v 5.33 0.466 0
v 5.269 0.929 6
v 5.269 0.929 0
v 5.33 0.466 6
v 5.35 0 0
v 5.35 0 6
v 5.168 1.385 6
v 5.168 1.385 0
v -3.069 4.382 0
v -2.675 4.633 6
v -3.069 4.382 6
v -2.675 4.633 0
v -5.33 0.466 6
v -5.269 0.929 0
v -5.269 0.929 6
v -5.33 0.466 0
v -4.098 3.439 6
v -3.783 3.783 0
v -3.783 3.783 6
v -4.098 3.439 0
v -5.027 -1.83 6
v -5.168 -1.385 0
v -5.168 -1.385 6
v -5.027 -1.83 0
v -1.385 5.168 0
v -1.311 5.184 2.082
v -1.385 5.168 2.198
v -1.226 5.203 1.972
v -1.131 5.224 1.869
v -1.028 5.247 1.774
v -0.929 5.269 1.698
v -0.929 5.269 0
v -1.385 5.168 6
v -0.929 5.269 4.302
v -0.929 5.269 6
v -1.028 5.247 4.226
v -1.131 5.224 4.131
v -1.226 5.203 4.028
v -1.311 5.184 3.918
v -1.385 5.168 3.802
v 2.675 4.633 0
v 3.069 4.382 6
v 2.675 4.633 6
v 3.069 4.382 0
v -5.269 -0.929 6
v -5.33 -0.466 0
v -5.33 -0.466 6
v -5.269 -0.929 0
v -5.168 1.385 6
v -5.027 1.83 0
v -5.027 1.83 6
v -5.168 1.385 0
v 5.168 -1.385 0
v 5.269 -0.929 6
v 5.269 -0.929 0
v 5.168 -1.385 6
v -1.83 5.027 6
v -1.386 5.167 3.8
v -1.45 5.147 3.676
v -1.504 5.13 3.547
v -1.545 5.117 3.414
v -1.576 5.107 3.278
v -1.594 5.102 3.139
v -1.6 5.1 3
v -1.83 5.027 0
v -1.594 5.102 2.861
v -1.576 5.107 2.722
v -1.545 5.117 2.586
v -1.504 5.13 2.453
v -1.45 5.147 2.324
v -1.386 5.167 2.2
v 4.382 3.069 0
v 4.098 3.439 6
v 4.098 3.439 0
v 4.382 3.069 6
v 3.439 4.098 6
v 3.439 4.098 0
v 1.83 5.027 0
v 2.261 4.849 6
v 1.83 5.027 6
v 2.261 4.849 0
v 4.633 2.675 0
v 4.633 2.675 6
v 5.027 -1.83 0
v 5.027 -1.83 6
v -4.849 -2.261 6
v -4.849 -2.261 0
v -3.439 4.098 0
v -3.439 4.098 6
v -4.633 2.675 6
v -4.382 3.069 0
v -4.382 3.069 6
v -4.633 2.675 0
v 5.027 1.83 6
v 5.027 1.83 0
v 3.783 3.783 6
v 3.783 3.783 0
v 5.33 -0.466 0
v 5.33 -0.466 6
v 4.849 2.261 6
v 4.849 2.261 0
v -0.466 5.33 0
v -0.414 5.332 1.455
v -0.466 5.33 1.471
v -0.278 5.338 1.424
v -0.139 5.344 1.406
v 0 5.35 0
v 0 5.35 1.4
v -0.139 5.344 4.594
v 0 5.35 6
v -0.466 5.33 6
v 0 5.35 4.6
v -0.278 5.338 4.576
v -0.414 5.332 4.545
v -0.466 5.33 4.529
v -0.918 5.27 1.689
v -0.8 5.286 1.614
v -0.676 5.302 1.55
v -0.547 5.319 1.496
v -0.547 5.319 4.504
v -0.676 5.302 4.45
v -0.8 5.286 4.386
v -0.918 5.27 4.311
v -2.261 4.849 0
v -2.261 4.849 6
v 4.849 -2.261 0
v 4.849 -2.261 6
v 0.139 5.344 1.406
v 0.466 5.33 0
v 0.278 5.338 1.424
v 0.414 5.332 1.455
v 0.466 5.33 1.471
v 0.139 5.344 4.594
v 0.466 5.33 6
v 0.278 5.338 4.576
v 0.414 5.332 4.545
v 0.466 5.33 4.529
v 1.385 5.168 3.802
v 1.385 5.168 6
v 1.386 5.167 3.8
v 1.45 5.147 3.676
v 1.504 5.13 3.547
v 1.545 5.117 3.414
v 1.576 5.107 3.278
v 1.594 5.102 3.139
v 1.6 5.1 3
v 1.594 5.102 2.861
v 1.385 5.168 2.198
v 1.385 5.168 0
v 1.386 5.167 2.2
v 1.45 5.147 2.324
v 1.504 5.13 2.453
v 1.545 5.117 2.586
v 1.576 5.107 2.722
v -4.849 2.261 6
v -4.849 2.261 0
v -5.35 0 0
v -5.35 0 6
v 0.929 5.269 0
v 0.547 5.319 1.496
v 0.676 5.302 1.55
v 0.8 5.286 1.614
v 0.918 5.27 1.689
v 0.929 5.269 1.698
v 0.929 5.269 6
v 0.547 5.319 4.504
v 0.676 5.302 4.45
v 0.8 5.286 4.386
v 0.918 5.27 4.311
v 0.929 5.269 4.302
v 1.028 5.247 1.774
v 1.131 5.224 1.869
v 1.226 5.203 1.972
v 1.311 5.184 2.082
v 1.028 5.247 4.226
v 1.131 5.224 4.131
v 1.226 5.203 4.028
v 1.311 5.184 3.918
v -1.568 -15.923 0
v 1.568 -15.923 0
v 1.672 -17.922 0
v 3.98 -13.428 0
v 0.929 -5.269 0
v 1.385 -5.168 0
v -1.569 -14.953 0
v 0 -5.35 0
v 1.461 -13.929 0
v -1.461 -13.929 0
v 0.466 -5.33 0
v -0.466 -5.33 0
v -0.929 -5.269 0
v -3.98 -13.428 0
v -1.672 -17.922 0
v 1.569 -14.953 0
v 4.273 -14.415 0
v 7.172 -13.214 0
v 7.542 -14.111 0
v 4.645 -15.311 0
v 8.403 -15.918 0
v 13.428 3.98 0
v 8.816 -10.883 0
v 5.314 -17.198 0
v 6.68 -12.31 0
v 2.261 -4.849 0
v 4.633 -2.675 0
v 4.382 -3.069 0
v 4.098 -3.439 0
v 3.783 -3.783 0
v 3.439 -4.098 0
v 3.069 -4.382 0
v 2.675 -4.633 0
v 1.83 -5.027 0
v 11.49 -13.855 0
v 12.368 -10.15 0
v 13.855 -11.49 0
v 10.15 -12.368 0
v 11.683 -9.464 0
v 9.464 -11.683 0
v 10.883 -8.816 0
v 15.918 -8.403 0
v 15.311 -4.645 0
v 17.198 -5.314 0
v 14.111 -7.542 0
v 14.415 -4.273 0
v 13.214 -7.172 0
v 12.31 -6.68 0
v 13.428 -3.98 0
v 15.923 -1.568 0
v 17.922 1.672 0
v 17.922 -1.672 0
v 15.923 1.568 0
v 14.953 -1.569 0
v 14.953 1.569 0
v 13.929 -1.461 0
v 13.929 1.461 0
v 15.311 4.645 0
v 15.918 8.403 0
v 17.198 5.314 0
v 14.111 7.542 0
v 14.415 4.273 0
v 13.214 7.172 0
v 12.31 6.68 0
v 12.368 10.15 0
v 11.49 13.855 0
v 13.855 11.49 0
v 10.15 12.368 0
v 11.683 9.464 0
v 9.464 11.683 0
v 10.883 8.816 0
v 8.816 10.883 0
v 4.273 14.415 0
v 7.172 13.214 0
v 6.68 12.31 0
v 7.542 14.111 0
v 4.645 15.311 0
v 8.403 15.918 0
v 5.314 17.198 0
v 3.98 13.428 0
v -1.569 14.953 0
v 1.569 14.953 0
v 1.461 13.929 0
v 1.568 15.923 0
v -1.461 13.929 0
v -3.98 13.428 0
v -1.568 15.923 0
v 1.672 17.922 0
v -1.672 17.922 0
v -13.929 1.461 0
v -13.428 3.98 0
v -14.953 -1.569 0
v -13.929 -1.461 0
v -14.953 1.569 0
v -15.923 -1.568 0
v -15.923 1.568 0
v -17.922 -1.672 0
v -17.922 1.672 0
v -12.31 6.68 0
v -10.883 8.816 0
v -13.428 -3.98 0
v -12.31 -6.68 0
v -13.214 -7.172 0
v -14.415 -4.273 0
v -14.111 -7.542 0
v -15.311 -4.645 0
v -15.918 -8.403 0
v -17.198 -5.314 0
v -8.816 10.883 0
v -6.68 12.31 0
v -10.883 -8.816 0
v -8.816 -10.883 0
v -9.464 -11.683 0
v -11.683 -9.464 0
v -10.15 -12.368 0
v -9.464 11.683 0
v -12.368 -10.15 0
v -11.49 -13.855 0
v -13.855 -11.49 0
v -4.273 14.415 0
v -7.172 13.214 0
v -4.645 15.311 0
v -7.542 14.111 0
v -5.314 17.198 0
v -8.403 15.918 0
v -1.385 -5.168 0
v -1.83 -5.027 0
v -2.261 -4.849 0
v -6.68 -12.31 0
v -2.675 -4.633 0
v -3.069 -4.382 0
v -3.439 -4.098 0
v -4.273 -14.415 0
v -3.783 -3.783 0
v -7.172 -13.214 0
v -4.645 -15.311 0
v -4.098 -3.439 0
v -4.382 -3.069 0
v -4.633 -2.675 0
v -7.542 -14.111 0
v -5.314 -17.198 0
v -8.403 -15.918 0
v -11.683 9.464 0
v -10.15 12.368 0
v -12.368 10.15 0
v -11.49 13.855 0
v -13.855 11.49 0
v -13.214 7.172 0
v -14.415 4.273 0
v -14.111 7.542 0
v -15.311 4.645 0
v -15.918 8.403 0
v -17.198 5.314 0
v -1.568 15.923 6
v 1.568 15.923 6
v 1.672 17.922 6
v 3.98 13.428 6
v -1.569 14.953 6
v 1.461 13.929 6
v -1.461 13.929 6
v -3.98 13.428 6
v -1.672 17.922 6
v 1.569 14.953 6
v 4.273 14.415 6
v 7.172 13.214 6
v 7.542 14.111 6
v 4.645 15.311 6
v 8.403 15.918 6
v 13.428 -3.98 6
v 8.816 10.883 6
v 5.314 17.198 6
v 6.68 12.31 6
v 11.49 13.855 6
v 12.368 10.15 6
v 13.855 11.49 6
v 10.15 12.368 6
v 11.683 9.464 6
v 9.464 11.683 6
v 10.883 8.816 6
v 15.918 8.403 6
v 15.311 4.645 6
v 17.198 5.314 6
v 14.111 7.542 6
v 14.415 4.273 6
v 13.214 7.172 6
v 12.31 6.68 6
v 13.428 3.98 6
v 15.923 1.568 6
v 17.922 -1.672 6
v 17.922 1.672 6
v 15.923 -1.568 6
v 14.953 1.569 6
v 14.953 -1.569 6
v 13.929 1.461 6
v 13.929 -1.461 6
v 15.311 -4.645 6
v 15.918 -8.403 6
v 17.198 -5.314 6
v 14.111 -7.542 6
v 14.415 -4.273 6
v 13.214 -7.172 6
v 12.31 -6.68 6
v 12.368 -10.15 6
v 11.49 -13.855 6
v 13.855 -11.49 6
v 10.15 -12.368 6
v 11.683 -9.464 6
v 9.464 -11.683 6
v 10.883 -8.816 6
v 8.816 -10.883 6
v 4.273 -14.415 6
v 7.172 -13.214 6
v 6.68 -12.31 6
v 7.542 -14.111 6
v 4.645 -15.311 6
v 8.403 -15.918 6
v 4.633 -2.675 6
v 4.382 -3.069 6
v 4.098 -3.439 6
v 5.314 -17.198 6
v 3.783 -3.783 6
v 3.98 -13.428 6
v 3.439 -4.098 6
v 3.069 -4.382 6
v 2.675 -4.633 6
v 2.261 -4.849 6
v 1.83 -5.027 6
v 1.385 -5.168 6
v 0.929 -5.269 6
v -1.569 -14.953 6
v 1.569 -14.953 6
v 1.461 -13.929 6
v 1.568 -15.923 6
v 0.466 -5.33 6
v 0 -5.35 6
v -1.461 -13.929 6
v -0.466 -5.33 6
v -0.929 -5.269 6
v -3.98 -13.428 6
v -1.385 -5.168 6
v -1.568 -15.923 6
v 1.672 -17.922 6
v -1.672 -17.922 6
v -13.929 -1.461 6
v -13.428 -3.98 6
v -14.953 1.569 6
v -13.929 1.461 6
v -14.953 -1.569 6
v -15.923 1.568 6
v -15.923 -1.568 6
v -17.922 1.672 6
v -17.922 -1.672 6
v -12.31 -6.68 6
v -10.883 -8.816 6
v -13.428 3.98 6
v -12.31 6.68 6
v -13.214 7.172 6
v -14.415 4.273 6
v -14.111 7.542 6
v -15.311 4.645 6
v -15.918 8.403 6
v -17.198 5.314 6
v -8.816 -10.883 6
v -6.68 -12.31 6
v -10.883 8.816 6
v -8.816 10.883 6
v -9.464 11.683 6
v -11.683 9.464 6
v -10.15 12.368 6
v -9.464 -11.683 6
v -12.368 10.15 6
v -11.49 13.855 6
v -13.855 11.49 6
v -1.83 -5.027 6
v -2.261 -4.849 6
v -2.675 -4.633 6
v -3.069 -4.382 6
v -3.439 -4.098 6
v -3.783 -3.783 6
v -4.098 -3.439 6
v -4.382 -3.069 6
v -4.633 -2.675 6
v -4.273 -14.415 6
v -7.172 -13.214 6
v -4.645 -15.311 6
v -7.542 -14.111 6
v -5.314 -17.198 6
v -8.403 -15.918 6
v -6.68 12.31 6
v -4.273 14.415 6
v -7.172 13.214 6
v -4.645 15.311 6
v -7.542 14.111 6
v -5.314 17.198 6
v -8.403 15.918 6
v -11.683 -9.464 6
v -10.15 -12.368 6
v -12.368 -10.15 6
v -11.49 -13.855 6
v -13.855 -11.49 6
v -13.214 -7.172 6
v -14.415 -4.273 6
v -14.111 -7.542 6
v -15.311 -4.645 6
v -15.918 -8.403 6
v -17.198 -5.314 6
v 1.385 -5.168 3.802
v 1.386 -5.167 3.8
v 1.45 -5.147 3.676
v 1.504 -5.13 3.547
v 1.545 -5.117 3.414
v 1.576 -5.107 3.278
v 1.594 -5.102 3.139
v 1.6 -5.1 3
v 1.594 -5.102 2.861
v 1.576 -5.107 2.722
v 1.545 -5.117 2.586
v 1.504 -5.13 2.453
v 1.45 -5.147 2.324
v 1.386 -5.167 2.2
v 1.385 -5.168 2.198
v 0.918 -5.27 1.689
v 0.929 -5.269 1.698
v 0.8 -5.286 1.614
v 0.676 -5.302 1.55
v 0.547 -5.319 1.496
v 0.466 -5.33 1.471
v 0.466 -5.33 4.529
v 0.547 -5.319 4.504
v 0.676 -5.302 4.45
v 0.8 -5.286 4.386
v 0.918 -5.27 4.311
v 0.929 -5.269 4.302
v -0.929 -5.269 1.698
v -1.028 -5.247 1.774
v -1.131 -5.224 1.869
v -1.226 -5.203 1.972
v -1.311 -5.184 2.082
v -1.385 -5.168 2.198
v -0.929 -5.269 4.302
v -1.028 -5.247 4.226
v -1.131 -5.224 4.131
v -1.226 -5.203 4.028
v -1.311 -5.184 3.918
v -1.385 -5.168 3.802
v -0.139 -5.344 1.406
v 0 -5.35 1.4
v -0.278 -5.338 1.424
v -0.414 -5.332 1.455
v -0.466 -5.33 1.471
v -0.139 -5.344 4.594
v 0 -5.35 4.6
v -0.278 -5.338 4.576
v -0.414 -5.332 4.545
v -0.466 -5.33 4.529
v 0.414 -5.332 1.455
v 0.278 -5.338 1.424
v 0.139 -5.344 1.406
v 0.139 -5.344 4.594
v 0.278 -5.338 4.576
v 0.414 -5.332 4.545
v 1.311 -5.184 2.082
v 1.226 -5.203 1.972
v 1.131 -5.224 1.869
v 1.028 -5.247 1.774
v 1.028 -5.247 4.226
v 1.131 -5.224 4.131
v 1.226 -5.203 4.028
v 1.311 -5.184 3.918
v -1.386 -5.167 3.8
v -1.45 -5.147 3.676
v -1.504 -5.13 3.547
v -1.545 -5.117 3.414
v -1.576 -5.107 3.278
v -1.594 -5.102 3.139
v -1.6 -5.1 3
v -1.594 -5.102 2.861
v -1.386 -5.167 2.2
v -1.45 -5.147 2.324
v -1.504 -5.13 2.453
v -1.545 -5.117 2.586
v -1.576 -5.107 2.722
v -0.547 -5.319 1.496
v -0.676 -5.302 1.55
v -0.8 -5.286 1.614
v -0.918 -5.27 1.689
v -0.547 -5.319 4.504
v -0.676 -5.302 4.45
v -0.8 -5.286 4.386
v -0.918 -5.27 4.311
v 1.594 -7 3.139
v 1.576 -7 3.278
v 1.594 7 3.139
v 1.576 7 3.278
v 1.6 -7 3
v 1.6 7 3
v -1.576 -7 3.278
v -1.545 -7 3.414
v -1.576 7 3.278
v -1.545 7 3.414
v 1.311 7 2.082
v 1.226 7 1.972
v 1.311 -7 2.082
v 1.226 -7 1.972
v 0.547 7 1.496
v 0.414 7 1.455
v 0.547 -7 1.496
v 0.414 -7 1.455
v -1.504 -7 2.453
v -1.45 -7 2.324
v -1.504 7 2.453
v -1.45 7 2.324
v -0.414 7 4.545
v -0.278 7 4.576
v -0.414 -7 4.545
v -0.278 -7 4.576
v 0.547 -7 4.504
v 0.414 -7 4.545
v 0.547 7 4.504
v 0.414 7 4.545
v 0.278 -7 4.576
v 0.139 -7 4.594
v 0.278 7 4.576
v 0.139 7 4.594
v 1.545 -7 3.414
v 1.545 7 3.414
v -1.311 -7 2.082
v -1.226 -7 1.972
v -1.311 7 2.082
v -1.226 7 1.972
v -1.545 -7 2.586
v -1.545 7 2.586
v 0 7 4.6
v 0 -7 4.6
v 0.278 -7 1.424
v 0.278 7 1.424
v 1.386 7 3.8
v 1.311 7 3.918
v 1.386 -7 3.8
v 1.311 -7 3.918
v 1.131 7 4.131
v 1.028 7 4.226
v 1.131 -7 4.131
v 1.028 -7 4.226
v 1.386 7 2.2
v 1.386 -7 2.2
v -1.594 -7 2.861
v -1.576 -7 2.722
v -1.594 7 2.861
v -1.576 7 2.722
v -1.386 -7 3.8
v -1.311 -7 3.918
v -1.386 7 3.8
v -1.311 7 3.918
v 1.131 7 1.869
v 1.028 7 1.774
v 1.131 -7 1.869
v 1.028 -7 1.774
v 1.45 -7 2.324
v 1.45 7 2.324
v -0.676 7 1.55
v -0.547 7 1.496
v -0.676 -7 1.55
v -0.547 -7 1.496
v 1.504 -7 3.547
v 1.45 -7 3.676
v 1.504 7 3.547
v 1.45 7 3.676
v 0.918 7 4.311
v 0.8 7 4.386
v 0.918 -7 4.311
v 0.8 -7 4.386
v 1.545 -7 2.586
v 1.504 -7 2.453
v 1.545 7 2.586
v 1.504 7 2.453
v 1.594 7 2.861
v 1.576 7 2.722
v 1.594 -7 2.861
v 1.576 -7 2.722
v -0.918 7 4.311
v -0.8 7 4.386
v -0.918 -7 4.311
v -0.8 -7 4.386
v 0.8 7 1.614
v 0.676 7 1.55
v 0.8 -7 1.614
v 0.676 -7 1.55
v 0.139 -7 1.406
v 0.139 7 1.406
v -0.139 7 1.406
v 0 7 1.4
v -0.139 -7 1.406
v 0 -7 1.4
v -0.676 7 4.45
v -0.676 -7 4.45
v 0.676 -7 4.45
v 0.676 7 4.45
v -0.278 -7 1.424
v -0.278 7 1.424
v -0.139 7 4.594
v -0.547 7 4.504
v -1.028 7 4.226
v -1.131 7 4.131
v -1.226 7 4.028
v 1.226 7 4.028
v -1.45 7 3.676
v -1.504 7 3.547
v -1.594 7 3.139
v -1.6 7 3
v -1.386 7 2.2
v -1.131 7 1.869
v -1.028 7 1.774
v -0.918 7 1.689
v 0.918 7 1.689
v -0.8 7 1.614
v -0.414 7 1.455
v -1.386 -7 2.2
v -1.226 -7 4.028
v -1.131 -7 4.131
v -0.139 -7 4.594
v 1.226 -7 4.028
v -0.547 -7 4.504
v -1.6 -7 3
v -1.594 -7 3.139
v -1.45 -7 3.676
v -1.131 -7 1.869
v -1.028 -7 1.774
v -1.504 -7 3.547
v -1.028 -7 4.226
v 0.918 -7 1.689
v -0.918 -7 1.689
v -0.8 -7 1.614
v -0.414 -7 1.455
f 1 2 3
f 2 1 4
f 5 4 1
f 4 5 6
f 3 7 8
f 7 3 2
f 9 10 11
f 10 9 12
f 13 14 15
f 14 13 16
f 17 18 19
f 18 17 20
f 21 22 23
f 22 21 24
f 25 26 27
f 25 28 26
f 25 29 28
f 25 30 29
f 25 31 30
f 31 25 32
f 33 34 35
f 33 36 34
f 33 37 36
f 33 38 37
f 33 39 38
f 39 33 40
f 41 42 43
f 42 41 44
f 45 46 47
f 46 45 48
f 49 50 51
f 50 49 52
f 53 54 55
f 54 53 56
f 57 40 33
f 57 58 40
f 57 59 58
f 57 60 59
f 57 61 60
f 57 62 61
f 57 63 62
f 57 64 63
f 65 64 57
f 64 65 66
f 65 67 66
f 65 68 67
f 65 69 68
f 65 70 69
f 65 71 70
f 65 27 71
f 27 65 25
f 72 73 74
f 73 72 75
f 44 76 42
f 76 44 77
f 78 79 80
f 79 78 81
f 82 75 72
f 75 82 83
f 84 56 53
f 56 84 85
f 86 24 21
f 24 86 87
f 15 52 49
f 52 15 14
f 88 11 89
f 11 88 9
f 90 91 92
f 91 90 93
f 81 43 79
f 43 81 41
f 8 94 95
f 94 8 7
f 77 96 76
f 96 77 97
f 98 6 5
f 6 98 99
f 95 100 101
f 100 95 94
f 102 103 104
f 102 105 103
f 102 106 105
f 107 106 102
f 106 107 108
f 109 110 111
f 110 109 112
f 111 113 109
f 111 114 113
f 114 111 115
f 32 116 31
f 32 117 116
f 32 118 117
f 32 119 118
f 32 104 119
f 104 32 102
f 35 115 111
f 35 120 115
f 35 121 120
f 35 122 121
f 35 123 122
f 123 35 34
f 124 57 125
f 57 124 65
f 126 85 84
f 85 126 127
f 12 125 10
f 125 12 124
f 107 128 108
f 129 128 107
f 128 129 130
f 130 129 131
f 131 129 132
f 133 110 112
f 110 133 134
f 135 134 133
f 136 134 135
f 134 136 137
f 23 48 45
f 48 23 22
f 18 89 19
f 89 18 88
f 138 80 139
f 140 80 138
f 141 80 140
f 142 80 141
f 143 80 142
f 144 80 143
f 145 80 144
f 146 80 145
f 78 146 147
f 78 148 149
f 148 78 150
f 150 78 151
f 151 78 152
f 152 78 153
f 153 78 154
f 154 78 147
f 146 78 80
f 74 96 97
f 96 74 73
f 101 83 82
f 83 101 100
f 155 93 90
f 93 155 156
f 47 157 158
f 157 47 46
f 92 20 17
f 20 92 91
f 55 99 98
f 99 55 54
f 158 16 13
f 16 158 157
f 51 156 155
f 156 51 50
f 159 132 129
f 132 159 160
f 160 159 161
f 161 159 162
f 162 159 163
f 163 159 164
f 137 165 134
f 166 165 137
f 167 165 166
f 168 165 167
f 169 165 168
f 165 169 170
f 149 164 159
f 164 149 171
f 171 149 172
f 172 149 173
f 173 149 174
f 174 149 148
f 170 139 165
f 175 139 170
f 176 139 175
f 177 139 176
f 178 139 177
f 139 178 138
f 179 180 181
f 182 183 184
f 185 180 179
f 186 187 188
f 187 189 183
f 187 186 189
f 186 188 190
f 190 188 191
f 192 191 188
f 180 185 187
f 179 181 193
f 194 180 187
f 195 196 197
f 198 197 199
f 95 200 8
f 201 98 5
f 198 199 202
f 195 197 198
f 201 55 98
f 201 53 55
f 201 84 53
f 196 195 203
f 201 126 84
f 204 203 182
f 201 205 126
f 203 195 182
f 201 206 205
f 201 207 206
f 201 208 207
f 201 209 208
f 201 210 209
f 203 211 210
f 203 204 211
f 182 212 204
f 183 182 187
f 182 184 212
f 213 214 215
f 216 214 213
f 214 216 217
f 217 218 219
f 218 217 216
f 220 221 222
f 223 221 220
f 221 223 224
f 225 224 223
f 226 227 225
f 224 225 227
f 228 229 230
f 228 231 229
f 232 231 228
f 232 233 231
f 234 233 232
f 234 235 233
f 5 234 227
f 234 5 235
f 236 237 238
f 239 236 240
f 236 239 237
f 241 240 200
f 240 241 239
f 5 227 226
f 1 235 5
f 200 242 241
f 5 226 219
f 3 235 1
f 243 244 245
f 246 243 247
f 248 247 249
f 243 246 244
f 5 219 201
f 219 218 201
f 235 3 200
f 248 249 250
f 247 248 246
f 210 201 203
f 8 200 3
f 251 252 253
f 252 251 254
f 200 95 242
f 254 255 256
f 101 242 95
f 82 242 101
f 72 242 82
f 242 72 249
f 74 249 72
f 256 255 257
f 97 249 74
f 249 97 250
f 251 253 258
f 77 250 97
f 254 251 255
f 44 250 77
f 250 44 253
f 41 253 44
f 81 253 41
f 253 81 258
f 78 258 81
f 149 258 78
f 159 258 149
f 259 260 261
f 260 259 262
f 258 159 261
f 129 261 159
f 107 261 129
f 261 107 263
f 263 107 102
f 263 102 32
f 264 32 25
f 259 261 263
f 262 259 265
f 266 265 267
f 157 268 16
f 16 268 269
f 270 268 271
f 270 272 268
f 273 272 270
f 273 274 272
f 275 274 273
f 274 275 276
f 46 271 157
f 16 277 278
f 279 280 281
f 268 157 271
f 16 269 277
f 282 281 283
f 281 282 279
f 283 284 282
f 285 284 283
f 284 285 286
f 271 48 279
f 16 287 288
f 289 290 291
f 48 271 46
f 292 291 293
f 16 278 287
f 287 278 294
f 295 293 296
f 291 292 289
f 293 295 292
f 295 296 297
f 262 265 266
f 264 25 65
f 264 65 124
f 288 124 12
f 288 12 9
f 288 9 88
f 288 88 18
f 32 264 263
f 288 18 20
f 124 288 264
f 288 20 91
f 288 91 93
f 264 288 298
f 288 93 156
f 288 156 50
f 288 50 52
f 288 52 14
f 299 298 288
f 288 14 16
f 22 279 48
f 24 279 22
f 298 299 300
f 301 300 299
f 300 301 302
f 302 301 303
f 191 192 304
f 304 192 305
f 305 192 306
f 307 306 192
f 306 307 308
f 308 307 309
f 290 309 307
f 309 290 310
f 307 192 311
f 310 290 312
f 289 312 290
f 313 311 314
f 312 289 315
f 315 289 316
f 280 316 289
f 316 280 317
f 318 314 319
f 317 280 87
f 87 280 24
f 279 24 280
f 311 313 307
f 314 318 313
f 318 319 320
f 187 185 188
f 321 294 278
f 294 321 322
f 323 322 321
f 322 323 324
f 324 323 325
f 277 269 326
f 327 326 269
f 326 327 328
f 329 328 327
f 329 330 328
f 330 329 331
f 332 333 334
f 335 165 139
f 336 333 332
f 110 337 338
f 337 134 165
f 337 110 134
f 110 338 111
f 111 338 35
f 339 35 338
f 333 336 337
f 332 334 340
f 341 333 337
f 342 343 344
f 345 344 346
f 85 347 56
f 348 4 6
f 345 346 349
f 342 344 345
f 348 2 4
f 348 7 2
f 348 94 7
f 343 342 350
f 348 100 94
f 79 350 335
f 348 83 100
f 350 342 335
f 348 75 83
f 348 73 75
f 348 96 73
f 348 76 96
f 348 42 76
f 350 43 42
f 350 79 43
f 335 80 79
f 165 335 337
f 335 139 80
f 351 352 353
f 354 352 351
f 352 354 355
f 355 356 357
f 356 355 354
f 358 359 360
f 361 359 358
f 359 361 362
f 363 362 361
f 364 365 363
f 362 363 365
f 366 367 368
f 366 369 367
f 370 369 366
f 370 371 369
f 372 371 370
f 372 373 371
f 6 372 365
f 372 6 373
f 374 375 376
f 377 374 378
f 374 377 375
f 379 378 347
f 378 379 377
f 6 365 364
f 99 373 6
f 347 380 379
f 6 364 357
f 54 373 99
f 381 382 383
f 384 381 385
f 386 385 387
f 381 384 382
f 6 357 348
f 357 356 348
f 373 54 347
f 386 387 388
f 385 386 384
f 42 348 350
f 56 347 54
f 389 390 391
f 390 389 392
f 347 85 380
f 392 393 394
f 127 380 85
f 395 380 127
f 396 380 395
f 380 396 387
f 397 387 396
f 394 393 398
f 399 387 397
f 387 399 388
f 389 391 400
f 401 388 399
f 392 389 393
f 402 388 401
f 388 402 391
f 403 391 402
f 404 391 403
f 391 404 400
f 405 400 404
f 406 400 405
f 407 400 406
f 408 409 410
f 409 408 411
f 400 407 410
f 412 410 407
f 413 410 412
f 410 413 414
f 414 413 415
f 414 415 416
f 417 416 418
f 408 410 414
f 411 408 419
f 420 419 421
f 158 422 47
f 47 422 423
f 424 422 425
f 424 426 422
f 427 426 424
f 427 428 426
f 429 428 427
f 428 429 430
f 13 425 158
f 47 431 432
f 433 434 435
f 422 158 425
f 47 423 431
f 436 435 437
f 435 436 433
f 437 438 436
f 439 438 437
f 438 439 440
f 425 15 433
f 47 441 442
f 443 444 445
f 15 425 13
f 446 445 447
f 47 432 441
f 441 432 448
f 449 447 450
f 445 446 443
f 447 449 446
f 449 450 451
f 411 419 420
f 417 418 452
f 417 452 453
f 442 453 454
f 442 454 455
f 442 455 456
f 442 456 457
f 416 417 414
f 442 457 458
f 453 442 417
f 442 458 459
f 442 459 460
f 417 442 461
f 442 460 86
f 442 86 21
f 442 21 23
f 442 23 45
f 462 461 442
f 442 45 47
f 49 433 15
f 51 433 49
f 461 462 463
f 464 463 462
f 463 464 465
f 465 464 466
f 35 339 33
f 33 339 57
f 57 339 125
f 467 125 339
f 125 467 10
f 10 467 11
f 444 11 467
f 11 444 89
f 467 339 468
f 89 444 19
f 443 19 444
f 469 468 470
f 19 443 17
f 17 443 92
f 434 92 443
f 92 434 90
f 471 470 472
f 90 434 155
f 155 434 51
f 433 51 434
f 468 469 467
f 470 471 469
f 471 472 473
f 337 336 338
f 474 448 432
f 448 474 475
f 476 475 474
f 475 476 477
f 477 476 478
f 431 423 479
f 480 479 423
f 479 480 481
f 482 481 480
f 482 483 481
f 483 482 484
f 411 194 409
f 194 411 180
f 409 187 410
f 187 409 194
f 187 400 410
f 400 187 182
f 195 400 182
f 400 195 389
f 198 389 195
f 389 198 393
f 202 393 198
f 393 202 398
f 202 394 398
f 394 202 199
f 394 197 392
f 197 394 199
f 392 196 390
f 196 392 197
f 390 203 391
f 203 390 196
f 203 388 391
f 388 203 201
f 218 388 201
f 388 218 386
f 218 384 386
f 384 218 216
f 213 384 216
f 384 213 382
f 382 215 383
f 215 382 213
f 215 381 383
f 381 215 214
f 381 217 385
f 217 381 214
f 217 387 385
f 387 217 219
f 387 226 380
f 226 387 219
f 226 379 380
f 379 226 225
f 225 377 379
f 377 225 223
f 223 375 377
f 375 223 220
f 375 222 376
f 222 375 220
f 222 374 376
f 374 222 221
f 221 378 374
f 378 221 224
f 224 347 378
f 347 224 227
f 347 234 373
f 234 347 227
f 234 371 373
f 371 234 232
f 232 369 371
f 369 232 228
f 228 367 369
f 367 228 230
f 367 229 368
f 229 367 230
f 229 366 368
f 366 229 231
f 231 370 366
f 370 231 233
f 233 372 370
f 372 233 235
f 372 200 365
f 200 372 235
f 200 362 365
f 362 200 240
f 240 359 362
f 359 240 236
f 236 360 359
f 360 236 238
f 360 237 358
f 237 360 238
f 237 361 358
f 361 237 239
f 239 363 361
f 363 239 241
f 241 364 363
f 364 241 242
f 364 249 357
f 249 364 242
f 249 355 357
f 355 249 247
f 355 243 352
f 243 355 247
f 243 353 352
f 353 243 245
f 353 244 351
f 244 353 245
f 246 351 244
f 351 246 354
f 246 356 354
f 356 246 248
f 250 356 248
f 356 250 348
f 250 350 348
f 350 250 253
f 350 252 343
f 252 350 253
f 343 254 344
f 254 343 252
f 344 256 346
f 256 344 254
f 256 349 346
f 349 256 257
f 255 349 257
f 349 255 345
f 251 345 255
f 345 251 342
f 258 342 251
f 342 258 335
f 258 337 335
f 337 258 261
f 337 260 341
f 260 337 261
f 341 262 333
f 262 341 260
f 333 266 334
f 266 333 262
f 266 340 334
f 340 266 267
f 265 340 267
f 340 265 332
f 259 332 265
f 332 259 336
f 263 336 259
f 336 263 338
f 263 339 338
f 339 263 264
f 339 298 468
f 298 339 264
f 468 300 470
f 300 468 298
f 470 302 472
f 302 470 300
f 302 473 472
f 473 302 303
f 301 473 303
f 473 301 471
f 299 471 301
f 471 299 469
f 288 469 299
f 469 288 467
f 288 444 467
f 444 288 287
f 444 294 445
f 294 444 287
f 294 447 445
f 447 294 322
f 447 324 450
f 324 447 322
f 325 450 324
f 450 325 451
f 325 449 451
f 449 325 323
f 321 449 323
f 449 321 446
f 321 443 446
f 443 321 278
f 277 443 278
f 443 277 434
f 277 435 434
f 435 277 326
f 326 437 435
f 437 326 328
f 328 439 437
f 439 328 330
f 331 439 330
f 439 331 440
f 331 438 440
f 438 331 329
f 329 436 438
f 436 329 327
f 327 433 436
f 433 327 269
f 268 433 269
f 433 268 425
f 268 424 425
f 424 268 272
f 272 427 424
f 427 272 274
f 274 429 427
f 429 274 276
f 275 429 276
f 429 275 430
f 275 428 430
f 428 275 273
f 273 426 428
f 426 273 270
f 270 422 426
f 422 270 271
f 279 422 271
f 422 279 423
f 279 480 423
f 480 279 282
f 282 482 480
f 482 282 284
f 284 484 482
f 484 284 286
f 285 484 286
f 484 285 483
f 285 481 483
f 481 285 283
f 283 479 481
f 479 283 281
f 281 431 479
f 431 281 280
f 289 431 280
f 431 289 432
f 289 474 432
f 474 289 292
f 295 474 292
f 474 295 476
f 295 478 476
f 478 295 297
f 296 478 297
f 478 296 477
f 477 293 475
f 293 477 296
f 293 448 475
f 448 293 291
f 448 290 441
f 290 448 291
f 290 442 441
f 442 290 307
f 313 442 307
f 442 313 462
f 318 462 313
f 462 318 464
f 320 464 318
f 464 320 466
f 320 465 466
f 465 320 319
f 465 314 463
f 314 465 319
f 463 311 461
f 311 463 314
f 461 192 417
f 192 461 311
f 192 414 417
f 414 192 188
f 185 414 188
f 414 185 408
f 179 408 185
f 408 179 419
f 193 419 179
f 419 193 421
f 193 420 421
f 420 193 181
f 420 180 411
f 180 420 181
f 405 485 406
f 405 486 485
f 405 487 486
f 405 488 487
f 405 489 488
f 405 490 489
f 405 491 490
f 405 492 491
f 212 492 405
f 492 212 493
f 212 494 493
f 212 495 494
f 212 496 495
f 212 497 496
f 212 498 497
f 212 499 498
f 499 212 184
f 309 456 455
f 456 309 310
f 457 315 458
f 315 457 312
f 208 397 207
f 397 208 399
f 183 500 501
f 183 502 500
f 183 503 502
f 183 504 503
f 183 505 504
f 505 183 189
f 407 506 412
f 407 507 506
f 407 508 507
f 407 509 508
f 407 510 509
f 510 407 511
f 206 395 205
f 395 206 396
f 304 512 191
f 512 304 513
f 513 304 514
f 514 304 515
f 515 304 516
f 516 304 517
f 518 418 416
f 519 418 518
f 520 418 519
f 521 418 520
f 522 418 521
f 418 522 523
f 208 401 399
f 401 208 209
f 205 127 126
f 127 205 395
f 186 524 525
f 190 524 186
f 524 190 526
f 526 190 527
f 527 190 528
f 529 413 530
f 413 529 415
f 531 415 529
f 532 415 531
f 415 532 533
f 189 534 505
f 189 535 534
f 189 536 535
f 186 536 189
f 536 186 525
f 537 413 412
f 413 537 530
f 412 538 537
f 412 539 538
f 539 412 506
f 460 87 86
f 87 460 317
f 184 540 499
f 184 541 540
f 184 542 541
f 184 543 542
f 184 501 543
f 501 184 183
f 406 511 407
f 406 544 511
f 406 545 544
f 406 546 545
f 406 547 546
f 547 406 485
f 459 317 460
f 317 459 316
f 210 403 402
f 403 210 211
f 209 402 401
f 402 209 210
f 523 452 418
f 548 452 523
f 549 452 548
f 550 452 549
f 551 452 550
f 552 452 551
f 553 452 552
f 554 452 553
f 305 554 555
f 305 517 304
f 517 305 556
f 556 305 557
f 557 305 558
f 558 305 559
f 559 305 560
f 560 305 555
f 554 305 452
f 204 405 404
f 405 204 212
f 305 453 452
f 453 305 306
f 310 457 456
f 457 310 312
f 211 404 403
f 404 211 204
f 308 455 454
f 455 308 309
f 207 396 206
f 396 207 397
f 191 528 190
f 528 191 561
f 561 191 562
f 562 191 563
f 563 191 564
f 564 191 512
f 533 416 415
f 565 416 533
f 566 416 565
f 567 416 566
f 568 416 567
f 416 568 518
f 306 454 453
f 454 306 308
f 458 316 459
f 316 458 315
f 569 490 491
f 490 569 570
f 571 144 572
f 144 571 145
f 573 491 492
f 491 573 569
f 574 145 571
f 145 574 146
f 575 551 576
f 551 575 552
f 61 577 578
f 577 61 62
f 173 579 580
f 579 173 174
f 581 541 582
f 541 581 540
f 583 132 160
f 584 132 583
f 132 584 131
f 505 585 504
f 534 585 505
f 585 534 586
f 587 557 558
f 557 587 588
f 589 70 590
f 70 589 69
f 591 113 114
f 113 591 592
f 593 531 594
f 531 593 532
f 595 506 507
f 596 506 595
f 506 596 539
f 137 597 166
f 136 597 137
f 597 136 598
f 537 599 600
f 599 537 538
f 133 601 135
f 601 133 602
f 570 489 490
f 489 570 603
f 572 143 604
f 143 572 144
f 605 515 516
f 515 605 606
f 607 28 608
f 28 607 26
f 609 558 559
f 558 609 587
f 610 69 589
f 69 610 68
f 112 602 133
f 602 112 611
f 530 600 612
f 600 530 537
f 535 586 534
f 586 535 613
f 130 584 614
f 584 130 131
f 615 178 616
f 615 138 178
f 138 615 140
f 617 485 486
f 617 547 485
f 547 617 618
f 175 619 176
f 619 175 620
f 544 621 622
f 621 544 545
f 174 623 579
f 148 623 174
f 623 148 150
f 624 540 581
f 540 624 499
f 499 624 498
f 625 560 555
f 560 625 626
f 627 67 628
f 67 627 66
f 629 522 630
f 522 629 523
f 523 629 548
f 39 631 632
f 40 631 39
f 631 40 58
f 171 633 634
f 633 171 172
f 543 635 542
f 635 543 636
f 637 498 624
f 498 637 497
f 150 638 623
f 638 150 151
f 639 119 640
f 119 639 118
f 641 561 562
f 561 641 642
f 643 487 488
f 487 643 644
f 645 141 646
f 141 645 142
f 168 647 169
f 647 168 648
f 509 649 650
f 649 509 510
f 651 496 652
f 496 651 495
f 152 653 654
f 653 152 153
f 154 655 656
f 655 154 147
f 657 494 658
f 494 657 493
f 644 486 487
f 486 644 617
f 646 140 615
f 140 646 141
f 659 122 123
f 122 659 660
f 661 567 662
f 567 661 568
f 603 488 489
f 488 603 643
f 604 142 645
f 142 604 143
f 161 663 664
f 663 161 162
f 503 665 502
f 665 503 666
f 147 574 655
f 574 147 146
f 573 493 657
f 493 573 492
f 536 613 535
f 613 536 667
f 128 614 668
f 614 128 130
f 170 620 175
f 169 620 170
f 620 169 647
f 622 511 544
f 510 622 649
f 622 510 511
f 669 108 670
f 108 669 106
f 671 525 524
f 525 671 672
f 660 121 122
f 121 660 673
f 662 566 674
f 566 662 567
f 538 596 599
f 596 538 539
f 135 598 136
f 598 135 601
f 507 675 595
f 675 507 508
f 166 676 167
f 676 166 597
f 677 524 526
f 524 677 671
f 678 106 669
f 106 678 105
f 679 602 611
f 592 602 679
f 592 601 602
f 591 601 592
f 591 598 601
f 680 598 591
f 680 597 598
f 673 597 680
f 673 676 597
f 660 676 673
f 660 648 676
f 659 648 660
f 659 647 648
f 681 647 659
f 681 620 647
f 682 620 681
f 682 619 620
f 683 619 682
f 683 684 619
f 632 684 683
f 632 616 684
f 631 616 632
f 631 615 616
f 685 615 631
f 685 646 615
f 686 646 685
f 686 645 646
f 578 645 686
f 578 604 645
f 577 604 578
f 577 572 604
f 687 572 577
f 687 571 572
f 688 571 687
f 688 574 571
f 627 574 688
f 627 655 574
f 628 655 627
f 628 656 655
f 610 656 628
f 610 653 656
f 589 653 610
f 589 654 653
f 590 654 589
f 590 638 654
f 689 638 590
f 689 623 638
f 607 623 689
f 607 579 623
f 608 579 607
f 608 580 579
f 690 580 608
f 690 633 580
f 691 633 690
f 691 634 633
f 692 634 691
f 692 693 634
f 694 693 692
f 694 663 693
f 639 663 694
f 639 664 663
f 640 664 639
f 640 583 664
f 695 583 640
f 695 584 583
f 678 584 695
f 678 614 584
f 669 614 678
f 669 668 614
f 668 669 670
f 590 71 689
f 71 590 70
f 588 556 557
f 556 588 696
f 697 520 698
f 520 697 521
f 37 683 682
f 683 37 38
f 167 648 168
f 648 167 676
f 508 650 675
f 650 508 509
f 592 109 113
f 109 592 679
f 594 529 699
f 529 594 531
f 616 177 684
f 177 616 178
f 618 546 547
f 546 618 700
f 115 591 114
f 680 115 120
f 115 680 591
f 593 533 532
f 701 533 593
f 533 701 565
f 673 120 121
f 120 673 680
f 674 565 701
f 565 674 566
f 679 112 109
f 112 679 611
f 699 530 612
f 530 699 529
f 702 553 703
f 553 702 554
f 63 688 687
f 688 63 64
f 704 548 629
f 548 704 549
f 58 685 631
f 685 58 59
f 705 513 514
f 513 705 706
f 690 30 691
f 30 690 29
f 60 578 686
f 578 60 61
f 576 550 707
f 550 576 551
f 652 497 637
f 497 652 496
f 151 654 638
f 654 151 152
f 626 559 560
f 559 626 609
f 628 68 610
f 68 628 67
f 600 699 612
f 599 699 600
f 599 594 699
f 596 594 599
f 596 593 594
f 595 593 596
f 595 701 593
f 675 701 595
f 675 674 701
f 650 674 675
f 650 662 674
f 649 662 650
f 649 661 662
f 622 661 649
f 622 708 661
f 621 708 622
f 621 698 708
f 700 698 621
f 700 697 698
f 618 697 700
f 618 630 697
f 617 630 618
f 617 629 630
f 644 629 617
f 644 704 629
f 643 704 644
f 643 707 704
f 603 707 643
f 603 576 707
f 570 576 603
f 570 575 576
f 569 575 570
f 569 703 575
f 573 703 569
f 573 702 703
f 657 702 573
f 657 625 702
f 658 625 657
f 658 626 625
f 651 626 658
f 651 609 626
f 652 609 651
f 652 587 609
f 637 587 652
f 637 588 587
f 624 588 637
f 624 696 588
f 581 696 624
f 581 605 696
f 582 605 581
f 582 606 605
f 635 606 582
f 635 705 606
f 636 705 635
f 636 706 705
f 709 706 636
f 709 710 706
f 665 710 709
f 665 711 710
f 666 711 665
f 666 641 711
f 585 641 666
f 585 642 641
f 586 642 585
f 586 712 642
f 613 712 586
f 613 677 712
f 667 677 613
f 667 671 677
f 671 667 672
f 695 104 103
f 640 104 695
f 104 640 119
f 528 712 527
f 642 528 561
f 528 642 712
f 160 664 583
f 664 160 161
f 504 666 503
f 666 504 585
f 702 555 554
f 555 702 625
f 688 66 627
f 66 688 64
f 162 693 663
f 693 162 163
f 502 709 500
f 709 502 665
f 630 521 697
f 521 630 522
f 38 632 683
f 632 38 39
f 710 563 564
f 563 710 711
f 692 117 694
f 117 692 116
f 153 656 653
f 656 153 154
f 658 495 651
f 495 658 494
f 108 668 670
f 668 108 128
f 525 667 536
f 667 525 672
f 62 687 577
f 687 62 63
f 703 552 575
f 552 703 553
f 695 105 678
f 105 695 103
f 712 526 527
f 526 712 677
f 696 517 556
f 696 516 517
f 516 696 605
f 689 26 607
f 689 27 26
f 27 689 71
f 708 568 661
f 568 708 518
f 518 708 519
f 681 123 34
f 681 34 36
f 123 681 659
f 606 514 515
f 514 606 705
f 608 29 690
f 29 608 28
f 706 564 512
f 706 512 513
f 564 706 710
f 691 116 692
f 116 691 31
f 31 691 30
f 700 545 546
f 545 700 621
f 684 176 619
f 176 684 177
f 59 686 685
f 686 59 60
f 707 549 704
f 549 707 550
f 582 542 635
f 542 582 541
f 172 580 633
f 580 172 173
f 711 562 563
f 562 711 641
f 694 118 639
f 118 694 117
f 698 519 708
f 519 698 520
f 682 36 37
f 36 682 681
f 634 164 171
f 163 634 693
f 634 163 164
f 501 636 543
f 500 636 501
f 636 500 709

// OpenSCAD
// file: common.scad
// ============================================================
// D29 牽引馬達教學模型 - 共用參數與輔助模組
// Shared parameters & helper modules for the traction-motor
// teaching aid, inspired by the "Type D29 Traction Motor"
// museum exhibit panel (Electromagnet Frame / Armature /
// Cables / Bearing / Gear).
// ============================================================

$fn = 72;

// ---- global fit ----
TOL      = 0.35;  // radial clearance for rotating/sliding fits
SCREW_D  = 3.2;    // M3 clearance hole
PILOT_D  = 2.6;    // M3 self-tap pilot hole (into a printed boss)
HEAD_D   = 6.4;    // M3 pan-head clearance
HEAD_H   = 3.2;

// ---- gears (齒輪 Gear drive to the wheel) ----
// MCAD's gear() sizes teeth from circular_pitch: pitch_diameter =
// number_of_teeth * circular_pitch / 180. Using the SAME circular
// pitch for both gears is what makes them mesh correctly.
GEAR_CIRC_PITCH = 360;
PINION_TEETH = 16;              // pitch dia. 32 mm -> on the armature
WHEEL_TEETH  = 32;              // pitch dia. 64 mm -> on the wheel axle
GEAR_THICK   = 6;
WHEEL_D      = 90;   // decorative "road wheel" disc driven by the axle gear
GEAR_CENTER_DIST = (PINION_TEETH + WHEEL_TEETH) * GEAR_CIRC_PITCH / 360; // = 48 mm

// ---- shaft / armature (Part B 電樞 Armature) ----
// Laid out sequentially along the shaft so nothing overlaps:
//   [0 .. BEARING_MARGIN]                bare shaft (near bearing journal)
//   [.. + COMM_LEN]                      commutator ring
//   [.. + GAP1]                          bare shaft / air gap
//   [.. + CORE_LEN]                      laminated core (sits inside the frame)
//   [.. + GAP2]                          bare shaft / air gap
//   [.. + DFLAT_LEN]                     D-flat drive end (the pinion sits on
//                                        the last GEAR_THICK mm of it, flush
//                                        with the shaft tip)
SHAFT_D       = 10;
BEARING_MARGIN = 8;
COMM_D        = 24;
COMM_LEN      = 16;
COMM_SEGS     = 12;
GAP1          = 8;
CORE_D        = 40;
CORE_LEN      = 50;
LAMINATION_N  = 12;   // number of simulated lamination grooves
GAP2          = 8;
DFLAT_LEN     = 24;    // length of the flat-sided drive end
DFLAT_CUT     = 2.6;   // material removed from round shaft to make the flat

COMM_Z        = BEARING_MARGIN;
CORE_Z        = COMM_Z + COMM_LEN + GAP1;
DFLAT_Z       = CORE_Z + CORE_LEN + GAP2;
SHAFT_LEN     = DFLAT_Z + DFLAT_LEN;
GEAR_Z        = SHAFT_LEN - GEAR_THICK;   // the pinion sits flush with the shaft tip
PIN_Z         = GEAR_Z + GEAR_THICK/2;    // retaining-pin hole, through the pinion's middle

// ---- frame / stator housing (Part A 磁框 Electromagnet Frame) ----
FRAME_ID     = CORE_D + 2*3.5;  // 3.5 mm air-gap each side
FRAME_WALL   = 7;
FRAME_OD     = FRAME_ID + 2*FRAME_WALL;
FRAME_LEN    = CORE_LEN + 20;
POLE_COUNT   = 4;
POLE_W       = 16;
POLE_PROJ    = 4;
// where the frame's own local z=0 sits once slid over the armature,
// so it is centred on the laminated core
FRAME_OFFSET = CORE_Z - (FRAME_LEN - CORE_LEN)/2;

// ---- bearing end caps (Part D 軸承 Bearing) ----
// slightly wider than the frame tube so the caps form a shoulder
// that rests against the stand's support collars
CAP_D        = FRAME_OD + 10;
CAP_T        = 9;
CAP_LIP_H    = 6;              // lip that sits inside the frame bore
BOLT_PCD     = FRAME_OD - 16;  // bolt circle diameter, 4 bolts

// ---- cable entry cover (Part C 引線 Cables) ----
CABLE_HOLE_D = 3.2;
CABLE_COUNT  = 4;

// ---- base display stand ----
// All shaft-axis parts (frame, armature, wheel axle) share ONE global
// layout: the shaft runs along +X at height SHAFT_HEIGHT. A part's own
// local Z axis (its "along the shaft" axis) is mapped onto global X by
// rotate([0,90,0]); its local z=0 lands at the given global X offset.
PLATE_W       = 200;
PLATE_D       = 150;
PLATE_T       = 6;
SHAFT_HEIGHT  = 55;   // height of the armature/wheel axle centreline above the base
WHEEL_AXLE_D  = 6;
COLLAR_OD     = FRAME_OD + 20;
COLLAR_T      = 10;

MOTOR_COLLAR_X1 = 40;                       // frame's local z=0 (near/commutator end)
MOTOR_COLLAR_X2 = MOTOR_COLLAR_X1 + FRAME_LEN;  // frame's local z=FRAME_LEN (far end)
ARMATURE_X0     = MOTOR_COLLAR_X1 - FRAME_OFFSET;  // armature's local z=0, in global X
GEAR_MESH_X     = ARMATURE_X0 + PIN_Z;      // global X where the pinion sits

WHEEL_POST_X1   = GEAR_MESH_X - 17;
WHEEL_POST_X2   = GEAR_MESH_X + 17;

// ---- text label helper ----
module label_text(txt, size=5.5, depth=0.8, font="WenQuanYi Zen Hei:style=Regular") {
    linear_extrude(height=depth)
        text(txt, size=size, halign="center", valign="center", font=font);
}

module bolt_clearance(h=20) {
    union() {
        cylinder(d=SCREW_D, h=h, center=true);
        translate([0,0,h/2-HEAD_H/2])
            cylinder(d=HEAD_D, h=HEAD_H+0.5, center=true);
    }
}

module bolt_pilot(h=20) {
    cylinder(d=PILOT_D, h=h);
}
// main file
// 齒輪 Pinion gear (mounts on the armature's D-flat). Prints flat.
include <common.scad>
use <parts.scad>
pinion_gear();
